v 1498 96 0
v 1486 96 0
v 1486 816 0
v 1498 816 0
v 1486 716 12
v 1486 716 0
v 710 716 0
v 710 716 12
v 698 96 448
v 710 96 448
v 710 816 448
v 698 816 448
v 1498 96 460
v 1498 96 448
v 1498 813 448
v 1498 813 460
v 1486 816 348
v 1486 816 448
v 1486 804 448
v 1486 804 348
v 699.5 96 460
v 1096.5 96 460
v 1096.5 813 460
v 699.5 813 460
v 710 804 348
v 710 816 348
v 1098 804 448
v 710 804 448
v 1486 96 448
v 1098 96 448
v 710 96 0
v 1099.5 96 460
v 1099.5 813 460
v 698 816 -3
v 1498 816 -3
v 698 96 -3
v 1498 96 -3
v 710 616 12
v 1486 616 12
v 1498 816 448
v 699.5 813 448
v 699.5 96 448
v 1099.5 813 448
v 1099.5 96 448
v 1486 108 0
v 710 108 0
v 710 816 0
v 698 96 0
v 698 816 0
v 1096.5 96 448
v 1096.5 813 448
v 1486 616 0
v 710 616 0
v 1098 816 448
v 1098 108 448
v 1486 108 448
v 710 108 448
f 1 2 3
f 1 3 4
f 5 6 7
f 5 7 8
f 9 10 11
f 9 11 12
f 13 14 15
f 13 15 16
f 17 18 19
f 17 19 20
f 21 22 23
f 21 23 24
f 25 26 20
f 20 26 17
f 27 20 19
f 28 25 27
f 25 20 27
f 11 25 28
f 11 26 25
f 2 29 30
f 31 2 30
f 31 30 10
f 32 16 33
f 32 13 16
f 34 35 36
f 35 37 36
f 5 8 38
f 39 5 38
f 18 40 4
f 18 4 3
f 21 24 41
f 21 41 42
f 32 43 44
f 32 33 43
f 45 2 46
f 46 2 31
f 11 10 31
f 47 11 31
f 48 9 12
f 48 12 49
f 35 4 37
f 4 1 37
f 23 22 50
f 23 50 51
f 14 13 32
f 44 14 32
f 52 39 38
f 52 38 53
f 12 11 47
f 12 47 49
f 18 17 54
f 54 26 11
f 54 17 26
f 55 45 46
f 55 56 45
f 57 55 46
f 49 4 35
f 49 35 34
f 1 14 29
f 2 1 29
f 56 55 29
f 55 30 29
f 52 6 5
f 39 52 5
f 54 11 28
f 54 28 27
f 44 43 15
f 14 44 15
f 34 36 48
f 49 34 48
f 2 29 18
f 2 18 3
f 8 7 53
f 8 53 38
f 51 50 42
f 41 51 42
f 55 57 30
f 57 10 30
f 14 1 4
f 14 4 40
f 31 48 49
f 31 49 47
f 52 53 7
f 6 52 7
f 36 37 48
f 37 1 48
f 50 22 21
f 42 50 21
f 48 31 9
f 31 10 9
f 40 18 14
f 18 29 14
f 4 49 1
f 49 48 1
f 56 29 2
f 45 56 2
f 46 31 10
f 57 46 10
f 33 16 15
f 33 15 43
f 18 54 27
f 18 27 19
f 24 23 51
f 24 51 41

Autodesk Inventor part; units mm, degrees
ref_plane "YZ Plane" through (0, 0, 0) normal (1, 0, 0) x (0, 1, 0)
sketch "Sketch1" plane through (0, 0, 0) normal (0, 0, 1) x (1, 0, 0)
  line L0 (-1498, 0) -> (1498, 0) construction
  line L1 (-1498, 0) -> (-898, 0)
  line L2 (-898, 0) -> (-898, 2068)
  line L3 (-898, 2068) -> (-1498, 2068)
  line L4 (-1498, 2068) -> (-1498, 0)
  line L5 (-898, 0) -> (-498, 0)
  line L6 (-498, 0) -> (-498, 816)
  line L7 (-498, 816) -> (-898, 816)
  line L8 (-898, 816) -> (-898, 0)
  line L9 (-498, 0) -> (102, 0)
  line L10 (102, 0) -> (102, 816)
  line L11 (102, 816) -> (-498, 816)
  line L12 (-498, 816) -> (-498, 0)
  line L13 (102, 0) -> (698, 0)
  line L14 (698, 0) -> (698, 668)
  line L15 (698, 668) -> (102, 668)
  line L16 (102, 668) -> (102, 0)
  line L17 (698, 0) -> (1498, 0)
  line L18 (1498, 0) -> (1498, 816)
  line L19 (1498, 816) -> (698, 816)
  line L20 (698, 816) -> (698, 0)
  line L21 (-1498, 0) -> (1498, 0)
  line L22 (1498, 0) -> (1498, 96)
  line L23 (1498, 96) -> (-1498, 96)
  line L24 (-1498, 96) -> (-1498, 0)
  line L25 (-898, 816) -> (1498, 816)
  line L26 (1498, 816) -> (1498, 832)
  line L27 (1498, 832) -> (-898, 832)
  line L28 (-898, 832) -> (-898, 816)
  line L29 (-898, 1972) -> (-498, 1972)
  line L30 (-498, 1972) -> (-498, 1372)
  line L31 (-498, 1372) -> (-898, 1372)
  line L32 (-898, 1372) -> (-898, 1972)
  line L33 (698, 1972) -> (1498, 1972)
  line L34 (1498, 1972) -> (1498, 1372)
  line L35 (1498, 1372) -> (698, 1372)
  line L36 (698, 1372) -> (698, 1972)
  line L37 (698, 1372) -> (98, 1372)
  line L38 (98, 1372) -> (98, 1972)
  line L39 (98, 1972) -> (698, 1972)
  line L40 (698, 1972) -> (698, 1372)
  line L41 (-498, 1372) -> (98, 1372)
  line L42 (-498, 1372) -> (-275, 1637.7611)
  line L43 (98, 1372) -> (-125, 1637.7611)
  line L44 (-275, 1637.7611) -> (-125, 1637.7611)
  line L45 (-125, 1637.7611) -> (-125, 2068)
  line L46 (-125, 2068) -> (-275, 2068)
  line L47 (-275, 2068) -> (-275, 1637.7611)
  line L48 (1098, 816) -> (1098, 96)
  line L49 (-198, 816) -> (-198, 96)
  line L50 (-898, 668) -> (-498, 668)
  line L51 (-1498, 520) -> (-898, 520)
  line L52 (-1498, 1579) -> (-898, 1579)
  line L53 (398, 1972) -> (398, 1372)
  line L54 (1098, 1972) -> (1098, 1372)
  line L55 (698, 1876) -> (1498, 1876)
  line L56 (698, 1468) -> (1498, 1468)
  line L57 (-1498, 1049.5) -> (-898, 1049.5)
  point P0 (0, 0)
  point P1 (0, 0)
  point P2 (0, 0)
  point P3 (1098, 816)
  point P4 (-198, 816)
  point P5 (0, 0)
  dimension "d0" = 2996
  dimension "d1" = 600
  dimension "d2" = 2068
  dimension "d3" = 400
  dimension "d4" = 816
  dimension "d5" = 600
  dimension "d6" = 816
  dimension "d7" = 596
  dimension "d8" = 668
  dimension "d9" = 800
  dimension "d10" = 816
  dimension "d11" = 96
  dimension "d12" = 16
  dimension "d13" = 400
  dimension "d14" = 600
  dimension "d15" = 96
  dimension "d16" = 800
  dimension "d17" = 600
  dimension "d18" = 600
  dimension "d19" = 600
  dimension "d20" = 50
  dimension "d21" = 150
  dimension "d22" = 148
  dimension "d23" = 1059
  dimension "d24" = 96
  dimension "d25" = 96
  dimension "d26" = 529.5
ref_plane "Work Plane1" through (1498, 96, 0) normal (0, 1, 0) x (-1, 0, 0)
sketch "Sketch2" plane through (1498, 96, 0) normal (0, 1, 0) x (-1, 0, 0)
  line L0 (800, 0) -> (0, 0)
  line L1 (0, 0) -> (0, 460)
  line L2 (0, 460) -> (800, 460)
  line L3 (800, 460) -> (800, 0)
  line L4 (788, 448) -> (12, 448)
  line L5 (12, 448) -> (12, 12)
  line L6 (12, 12) -> (788, 12)
  line L7 (788, 12) -> (788, 448)
  line L8 (788, 12) -> (788, 0)
  line L9 (12, 12) -> (12, 0)
  line L10 (12, 448) -> (0, 448)
  line L11 (788, 448) -> (800, 448)
  point P0 (1498, 0)
  point P1 (800, 0)
  point P2 (0, 0)
  dimension "d28" = 460
  dimension "d29" = 12
extrude "Extrusion1" add sketch "Sketch2" along normal up to surface (720 mm away) contours L0 L8 L7 L11 L3 | L0 L1 L10 L5 L9
extrude "Extrusion2" add sketch "Sketch2" along normal up to surface (720 mm away) separate body contours L11 L4 L10 L1 L2 L3
split body "Split1" sketch "Sketch1" result two bodies bodies 2 curves L48 first body at (1231.3333, 576, 459.5)
sketch "Sketch3" plane through (1498, 96, 0) normal (0, 1, 0) x (-1, 0, 0)
  line L0 (800, 448) -> (800, 0) projected
  line L1 (800, 0) -> (0, 0)
  line L2 (0, 0) -> (0, -3)
  line L3 (0, -3) -> (800, -3)
  line L4 (800, -3) -> (800, 0)
  point P0 (1498, 0)
  dimension "d34" = 3
extrude "Extrusion3" add sketch "Sketch3" along normal up to surface (720 mm away) separate body
sketch "Sketch5" plane through (1498, 96, 0) normal (0, 1, 0) x (-1, 0, 0)
  line L0 (788, 0) -> (788, 448) projected
  line L1 (800, 448) -> (400, 448) projected
  line L2 (400, 448) -> (0, 448) projected
  line L3 (12, 448) -> (12, 0) projected
  line L4 (0, 0) -> (800, 0) projected
  point P0 (1498, 0)
extrude "Extrusion5" add sketch "Sketch5" along normal blind 12 separate body
sketch "Sketch4" plane through (1486, 96, 0) normal (-1, 0, 0) x (0, 0, 1)
  line L0 (0, 0) -> (0, 720) projected
  line L1 (0, 620) -> (12, 620)
  line L2 (12, 620) -> (12, 520)
  line L3 (12, 520) -> (0, 520)
  line L4 (0, 520) -> (0, 620)
  point P0 (0, -96)
  point P1 (0, 620)
  point P2 (0, 520)
  dimension "d37" = 12
  dimension "d38" = 100
  dimension "d39" = 100
extrude "Extrusion4" add sketch "Sketch4" along normal up to surface (776 mm away) separate body
ref_plane "Work Plane2" through (1498, 816, 336) normal (0, -1, 0) x (0, 0, 1)
sketch "Sketch6" plane through (1498, 816, 336) normal (0, -1, 0) x (0, 0, 1)
  line L0 (-336, 788) -> (112, 788) projected
  line L1 (112, 800) -> (112, 400) projected
  line L2 (112, 400) -> (112, 0) projected
  line L3 (112, 12) -> (-336, 12) projected
  line L4 (12, 788) -> (12, 12)
  point P0 (-336, 1498)
  dimension "d44" = 100
extrude "Extrusion6" add sketch "Sketch6" along normal blind 12 separate body
sketch "Sketch7" plane through (1498, 96, 460) normal (0, 0, 1) x (1, 0, 0)
  line L0 (-800, 720) -> (-400, 720) projected
  line L1 (0, 0) -> (-400, 0) projected
  line L2 (-401.5, 720) -> (-398.5, 720)
  line L3 (-398.5, 720) -> (-398.5, 0)
  line L4 (-398.5, 0) -> (-401.5, 0)
  line L5 (-401.5, 0) -> (-401.5, 720)
  line L6 (-400, 0) -> (-400, 720) projected
  point P0 (-1498, -96)
  dimension "d47" = 1.5
  dimension "d48" = 1.5
extrude "Extrusion7" cut sketch "Sketch7" against normal blind 12 bodies 3 4
sketch "Sketch8" plane through (698, 96, 460) normal (0, 0, 1) x (1, 0, 0)
  line L0 (0, 0) -> (0, 720) projected
  line L1 (800, 0) -> (800, 720) projected
  line L2 (0, 720) -> (800, 720)
  line L3 (800, 720) -> (800, 717)
  line L4 (800, 717) -> (0, 717)
  line L5 (0, 717) -> (0, 720)
  line L6 (0, 0) -> (398.5, 0) projected
  line L7 (0, 717) -> (1.5, 717)
  line L8 (1.5, 717) -> (1.5, 0)
  line L9 (1.5, 0) -> (0, 0)
  line L10 (0, 0) -> (0, 717)
  line L11 (800, 717) -> (798.5, 717)
  line L12 (798.5, 717) -> (798.5, 0)
  line L13 (798.5, 0) -> (800, 0)
  line L14 (800, 0) -> (800, 717)
  point P0 (-698, -96)
  point P1 (1.5, 717)
  dimension "d51" = 3
  dimension "d52" = 1.5
  dimension "d53" = 1.5
extrude "Extrusion8" cut sketch "Sketch8" against normal blind 12 contours L0 L4 L8 L6 | L0 L2 L1 L4 bodies 4 3
properties part number "Base Cabinet 4"
